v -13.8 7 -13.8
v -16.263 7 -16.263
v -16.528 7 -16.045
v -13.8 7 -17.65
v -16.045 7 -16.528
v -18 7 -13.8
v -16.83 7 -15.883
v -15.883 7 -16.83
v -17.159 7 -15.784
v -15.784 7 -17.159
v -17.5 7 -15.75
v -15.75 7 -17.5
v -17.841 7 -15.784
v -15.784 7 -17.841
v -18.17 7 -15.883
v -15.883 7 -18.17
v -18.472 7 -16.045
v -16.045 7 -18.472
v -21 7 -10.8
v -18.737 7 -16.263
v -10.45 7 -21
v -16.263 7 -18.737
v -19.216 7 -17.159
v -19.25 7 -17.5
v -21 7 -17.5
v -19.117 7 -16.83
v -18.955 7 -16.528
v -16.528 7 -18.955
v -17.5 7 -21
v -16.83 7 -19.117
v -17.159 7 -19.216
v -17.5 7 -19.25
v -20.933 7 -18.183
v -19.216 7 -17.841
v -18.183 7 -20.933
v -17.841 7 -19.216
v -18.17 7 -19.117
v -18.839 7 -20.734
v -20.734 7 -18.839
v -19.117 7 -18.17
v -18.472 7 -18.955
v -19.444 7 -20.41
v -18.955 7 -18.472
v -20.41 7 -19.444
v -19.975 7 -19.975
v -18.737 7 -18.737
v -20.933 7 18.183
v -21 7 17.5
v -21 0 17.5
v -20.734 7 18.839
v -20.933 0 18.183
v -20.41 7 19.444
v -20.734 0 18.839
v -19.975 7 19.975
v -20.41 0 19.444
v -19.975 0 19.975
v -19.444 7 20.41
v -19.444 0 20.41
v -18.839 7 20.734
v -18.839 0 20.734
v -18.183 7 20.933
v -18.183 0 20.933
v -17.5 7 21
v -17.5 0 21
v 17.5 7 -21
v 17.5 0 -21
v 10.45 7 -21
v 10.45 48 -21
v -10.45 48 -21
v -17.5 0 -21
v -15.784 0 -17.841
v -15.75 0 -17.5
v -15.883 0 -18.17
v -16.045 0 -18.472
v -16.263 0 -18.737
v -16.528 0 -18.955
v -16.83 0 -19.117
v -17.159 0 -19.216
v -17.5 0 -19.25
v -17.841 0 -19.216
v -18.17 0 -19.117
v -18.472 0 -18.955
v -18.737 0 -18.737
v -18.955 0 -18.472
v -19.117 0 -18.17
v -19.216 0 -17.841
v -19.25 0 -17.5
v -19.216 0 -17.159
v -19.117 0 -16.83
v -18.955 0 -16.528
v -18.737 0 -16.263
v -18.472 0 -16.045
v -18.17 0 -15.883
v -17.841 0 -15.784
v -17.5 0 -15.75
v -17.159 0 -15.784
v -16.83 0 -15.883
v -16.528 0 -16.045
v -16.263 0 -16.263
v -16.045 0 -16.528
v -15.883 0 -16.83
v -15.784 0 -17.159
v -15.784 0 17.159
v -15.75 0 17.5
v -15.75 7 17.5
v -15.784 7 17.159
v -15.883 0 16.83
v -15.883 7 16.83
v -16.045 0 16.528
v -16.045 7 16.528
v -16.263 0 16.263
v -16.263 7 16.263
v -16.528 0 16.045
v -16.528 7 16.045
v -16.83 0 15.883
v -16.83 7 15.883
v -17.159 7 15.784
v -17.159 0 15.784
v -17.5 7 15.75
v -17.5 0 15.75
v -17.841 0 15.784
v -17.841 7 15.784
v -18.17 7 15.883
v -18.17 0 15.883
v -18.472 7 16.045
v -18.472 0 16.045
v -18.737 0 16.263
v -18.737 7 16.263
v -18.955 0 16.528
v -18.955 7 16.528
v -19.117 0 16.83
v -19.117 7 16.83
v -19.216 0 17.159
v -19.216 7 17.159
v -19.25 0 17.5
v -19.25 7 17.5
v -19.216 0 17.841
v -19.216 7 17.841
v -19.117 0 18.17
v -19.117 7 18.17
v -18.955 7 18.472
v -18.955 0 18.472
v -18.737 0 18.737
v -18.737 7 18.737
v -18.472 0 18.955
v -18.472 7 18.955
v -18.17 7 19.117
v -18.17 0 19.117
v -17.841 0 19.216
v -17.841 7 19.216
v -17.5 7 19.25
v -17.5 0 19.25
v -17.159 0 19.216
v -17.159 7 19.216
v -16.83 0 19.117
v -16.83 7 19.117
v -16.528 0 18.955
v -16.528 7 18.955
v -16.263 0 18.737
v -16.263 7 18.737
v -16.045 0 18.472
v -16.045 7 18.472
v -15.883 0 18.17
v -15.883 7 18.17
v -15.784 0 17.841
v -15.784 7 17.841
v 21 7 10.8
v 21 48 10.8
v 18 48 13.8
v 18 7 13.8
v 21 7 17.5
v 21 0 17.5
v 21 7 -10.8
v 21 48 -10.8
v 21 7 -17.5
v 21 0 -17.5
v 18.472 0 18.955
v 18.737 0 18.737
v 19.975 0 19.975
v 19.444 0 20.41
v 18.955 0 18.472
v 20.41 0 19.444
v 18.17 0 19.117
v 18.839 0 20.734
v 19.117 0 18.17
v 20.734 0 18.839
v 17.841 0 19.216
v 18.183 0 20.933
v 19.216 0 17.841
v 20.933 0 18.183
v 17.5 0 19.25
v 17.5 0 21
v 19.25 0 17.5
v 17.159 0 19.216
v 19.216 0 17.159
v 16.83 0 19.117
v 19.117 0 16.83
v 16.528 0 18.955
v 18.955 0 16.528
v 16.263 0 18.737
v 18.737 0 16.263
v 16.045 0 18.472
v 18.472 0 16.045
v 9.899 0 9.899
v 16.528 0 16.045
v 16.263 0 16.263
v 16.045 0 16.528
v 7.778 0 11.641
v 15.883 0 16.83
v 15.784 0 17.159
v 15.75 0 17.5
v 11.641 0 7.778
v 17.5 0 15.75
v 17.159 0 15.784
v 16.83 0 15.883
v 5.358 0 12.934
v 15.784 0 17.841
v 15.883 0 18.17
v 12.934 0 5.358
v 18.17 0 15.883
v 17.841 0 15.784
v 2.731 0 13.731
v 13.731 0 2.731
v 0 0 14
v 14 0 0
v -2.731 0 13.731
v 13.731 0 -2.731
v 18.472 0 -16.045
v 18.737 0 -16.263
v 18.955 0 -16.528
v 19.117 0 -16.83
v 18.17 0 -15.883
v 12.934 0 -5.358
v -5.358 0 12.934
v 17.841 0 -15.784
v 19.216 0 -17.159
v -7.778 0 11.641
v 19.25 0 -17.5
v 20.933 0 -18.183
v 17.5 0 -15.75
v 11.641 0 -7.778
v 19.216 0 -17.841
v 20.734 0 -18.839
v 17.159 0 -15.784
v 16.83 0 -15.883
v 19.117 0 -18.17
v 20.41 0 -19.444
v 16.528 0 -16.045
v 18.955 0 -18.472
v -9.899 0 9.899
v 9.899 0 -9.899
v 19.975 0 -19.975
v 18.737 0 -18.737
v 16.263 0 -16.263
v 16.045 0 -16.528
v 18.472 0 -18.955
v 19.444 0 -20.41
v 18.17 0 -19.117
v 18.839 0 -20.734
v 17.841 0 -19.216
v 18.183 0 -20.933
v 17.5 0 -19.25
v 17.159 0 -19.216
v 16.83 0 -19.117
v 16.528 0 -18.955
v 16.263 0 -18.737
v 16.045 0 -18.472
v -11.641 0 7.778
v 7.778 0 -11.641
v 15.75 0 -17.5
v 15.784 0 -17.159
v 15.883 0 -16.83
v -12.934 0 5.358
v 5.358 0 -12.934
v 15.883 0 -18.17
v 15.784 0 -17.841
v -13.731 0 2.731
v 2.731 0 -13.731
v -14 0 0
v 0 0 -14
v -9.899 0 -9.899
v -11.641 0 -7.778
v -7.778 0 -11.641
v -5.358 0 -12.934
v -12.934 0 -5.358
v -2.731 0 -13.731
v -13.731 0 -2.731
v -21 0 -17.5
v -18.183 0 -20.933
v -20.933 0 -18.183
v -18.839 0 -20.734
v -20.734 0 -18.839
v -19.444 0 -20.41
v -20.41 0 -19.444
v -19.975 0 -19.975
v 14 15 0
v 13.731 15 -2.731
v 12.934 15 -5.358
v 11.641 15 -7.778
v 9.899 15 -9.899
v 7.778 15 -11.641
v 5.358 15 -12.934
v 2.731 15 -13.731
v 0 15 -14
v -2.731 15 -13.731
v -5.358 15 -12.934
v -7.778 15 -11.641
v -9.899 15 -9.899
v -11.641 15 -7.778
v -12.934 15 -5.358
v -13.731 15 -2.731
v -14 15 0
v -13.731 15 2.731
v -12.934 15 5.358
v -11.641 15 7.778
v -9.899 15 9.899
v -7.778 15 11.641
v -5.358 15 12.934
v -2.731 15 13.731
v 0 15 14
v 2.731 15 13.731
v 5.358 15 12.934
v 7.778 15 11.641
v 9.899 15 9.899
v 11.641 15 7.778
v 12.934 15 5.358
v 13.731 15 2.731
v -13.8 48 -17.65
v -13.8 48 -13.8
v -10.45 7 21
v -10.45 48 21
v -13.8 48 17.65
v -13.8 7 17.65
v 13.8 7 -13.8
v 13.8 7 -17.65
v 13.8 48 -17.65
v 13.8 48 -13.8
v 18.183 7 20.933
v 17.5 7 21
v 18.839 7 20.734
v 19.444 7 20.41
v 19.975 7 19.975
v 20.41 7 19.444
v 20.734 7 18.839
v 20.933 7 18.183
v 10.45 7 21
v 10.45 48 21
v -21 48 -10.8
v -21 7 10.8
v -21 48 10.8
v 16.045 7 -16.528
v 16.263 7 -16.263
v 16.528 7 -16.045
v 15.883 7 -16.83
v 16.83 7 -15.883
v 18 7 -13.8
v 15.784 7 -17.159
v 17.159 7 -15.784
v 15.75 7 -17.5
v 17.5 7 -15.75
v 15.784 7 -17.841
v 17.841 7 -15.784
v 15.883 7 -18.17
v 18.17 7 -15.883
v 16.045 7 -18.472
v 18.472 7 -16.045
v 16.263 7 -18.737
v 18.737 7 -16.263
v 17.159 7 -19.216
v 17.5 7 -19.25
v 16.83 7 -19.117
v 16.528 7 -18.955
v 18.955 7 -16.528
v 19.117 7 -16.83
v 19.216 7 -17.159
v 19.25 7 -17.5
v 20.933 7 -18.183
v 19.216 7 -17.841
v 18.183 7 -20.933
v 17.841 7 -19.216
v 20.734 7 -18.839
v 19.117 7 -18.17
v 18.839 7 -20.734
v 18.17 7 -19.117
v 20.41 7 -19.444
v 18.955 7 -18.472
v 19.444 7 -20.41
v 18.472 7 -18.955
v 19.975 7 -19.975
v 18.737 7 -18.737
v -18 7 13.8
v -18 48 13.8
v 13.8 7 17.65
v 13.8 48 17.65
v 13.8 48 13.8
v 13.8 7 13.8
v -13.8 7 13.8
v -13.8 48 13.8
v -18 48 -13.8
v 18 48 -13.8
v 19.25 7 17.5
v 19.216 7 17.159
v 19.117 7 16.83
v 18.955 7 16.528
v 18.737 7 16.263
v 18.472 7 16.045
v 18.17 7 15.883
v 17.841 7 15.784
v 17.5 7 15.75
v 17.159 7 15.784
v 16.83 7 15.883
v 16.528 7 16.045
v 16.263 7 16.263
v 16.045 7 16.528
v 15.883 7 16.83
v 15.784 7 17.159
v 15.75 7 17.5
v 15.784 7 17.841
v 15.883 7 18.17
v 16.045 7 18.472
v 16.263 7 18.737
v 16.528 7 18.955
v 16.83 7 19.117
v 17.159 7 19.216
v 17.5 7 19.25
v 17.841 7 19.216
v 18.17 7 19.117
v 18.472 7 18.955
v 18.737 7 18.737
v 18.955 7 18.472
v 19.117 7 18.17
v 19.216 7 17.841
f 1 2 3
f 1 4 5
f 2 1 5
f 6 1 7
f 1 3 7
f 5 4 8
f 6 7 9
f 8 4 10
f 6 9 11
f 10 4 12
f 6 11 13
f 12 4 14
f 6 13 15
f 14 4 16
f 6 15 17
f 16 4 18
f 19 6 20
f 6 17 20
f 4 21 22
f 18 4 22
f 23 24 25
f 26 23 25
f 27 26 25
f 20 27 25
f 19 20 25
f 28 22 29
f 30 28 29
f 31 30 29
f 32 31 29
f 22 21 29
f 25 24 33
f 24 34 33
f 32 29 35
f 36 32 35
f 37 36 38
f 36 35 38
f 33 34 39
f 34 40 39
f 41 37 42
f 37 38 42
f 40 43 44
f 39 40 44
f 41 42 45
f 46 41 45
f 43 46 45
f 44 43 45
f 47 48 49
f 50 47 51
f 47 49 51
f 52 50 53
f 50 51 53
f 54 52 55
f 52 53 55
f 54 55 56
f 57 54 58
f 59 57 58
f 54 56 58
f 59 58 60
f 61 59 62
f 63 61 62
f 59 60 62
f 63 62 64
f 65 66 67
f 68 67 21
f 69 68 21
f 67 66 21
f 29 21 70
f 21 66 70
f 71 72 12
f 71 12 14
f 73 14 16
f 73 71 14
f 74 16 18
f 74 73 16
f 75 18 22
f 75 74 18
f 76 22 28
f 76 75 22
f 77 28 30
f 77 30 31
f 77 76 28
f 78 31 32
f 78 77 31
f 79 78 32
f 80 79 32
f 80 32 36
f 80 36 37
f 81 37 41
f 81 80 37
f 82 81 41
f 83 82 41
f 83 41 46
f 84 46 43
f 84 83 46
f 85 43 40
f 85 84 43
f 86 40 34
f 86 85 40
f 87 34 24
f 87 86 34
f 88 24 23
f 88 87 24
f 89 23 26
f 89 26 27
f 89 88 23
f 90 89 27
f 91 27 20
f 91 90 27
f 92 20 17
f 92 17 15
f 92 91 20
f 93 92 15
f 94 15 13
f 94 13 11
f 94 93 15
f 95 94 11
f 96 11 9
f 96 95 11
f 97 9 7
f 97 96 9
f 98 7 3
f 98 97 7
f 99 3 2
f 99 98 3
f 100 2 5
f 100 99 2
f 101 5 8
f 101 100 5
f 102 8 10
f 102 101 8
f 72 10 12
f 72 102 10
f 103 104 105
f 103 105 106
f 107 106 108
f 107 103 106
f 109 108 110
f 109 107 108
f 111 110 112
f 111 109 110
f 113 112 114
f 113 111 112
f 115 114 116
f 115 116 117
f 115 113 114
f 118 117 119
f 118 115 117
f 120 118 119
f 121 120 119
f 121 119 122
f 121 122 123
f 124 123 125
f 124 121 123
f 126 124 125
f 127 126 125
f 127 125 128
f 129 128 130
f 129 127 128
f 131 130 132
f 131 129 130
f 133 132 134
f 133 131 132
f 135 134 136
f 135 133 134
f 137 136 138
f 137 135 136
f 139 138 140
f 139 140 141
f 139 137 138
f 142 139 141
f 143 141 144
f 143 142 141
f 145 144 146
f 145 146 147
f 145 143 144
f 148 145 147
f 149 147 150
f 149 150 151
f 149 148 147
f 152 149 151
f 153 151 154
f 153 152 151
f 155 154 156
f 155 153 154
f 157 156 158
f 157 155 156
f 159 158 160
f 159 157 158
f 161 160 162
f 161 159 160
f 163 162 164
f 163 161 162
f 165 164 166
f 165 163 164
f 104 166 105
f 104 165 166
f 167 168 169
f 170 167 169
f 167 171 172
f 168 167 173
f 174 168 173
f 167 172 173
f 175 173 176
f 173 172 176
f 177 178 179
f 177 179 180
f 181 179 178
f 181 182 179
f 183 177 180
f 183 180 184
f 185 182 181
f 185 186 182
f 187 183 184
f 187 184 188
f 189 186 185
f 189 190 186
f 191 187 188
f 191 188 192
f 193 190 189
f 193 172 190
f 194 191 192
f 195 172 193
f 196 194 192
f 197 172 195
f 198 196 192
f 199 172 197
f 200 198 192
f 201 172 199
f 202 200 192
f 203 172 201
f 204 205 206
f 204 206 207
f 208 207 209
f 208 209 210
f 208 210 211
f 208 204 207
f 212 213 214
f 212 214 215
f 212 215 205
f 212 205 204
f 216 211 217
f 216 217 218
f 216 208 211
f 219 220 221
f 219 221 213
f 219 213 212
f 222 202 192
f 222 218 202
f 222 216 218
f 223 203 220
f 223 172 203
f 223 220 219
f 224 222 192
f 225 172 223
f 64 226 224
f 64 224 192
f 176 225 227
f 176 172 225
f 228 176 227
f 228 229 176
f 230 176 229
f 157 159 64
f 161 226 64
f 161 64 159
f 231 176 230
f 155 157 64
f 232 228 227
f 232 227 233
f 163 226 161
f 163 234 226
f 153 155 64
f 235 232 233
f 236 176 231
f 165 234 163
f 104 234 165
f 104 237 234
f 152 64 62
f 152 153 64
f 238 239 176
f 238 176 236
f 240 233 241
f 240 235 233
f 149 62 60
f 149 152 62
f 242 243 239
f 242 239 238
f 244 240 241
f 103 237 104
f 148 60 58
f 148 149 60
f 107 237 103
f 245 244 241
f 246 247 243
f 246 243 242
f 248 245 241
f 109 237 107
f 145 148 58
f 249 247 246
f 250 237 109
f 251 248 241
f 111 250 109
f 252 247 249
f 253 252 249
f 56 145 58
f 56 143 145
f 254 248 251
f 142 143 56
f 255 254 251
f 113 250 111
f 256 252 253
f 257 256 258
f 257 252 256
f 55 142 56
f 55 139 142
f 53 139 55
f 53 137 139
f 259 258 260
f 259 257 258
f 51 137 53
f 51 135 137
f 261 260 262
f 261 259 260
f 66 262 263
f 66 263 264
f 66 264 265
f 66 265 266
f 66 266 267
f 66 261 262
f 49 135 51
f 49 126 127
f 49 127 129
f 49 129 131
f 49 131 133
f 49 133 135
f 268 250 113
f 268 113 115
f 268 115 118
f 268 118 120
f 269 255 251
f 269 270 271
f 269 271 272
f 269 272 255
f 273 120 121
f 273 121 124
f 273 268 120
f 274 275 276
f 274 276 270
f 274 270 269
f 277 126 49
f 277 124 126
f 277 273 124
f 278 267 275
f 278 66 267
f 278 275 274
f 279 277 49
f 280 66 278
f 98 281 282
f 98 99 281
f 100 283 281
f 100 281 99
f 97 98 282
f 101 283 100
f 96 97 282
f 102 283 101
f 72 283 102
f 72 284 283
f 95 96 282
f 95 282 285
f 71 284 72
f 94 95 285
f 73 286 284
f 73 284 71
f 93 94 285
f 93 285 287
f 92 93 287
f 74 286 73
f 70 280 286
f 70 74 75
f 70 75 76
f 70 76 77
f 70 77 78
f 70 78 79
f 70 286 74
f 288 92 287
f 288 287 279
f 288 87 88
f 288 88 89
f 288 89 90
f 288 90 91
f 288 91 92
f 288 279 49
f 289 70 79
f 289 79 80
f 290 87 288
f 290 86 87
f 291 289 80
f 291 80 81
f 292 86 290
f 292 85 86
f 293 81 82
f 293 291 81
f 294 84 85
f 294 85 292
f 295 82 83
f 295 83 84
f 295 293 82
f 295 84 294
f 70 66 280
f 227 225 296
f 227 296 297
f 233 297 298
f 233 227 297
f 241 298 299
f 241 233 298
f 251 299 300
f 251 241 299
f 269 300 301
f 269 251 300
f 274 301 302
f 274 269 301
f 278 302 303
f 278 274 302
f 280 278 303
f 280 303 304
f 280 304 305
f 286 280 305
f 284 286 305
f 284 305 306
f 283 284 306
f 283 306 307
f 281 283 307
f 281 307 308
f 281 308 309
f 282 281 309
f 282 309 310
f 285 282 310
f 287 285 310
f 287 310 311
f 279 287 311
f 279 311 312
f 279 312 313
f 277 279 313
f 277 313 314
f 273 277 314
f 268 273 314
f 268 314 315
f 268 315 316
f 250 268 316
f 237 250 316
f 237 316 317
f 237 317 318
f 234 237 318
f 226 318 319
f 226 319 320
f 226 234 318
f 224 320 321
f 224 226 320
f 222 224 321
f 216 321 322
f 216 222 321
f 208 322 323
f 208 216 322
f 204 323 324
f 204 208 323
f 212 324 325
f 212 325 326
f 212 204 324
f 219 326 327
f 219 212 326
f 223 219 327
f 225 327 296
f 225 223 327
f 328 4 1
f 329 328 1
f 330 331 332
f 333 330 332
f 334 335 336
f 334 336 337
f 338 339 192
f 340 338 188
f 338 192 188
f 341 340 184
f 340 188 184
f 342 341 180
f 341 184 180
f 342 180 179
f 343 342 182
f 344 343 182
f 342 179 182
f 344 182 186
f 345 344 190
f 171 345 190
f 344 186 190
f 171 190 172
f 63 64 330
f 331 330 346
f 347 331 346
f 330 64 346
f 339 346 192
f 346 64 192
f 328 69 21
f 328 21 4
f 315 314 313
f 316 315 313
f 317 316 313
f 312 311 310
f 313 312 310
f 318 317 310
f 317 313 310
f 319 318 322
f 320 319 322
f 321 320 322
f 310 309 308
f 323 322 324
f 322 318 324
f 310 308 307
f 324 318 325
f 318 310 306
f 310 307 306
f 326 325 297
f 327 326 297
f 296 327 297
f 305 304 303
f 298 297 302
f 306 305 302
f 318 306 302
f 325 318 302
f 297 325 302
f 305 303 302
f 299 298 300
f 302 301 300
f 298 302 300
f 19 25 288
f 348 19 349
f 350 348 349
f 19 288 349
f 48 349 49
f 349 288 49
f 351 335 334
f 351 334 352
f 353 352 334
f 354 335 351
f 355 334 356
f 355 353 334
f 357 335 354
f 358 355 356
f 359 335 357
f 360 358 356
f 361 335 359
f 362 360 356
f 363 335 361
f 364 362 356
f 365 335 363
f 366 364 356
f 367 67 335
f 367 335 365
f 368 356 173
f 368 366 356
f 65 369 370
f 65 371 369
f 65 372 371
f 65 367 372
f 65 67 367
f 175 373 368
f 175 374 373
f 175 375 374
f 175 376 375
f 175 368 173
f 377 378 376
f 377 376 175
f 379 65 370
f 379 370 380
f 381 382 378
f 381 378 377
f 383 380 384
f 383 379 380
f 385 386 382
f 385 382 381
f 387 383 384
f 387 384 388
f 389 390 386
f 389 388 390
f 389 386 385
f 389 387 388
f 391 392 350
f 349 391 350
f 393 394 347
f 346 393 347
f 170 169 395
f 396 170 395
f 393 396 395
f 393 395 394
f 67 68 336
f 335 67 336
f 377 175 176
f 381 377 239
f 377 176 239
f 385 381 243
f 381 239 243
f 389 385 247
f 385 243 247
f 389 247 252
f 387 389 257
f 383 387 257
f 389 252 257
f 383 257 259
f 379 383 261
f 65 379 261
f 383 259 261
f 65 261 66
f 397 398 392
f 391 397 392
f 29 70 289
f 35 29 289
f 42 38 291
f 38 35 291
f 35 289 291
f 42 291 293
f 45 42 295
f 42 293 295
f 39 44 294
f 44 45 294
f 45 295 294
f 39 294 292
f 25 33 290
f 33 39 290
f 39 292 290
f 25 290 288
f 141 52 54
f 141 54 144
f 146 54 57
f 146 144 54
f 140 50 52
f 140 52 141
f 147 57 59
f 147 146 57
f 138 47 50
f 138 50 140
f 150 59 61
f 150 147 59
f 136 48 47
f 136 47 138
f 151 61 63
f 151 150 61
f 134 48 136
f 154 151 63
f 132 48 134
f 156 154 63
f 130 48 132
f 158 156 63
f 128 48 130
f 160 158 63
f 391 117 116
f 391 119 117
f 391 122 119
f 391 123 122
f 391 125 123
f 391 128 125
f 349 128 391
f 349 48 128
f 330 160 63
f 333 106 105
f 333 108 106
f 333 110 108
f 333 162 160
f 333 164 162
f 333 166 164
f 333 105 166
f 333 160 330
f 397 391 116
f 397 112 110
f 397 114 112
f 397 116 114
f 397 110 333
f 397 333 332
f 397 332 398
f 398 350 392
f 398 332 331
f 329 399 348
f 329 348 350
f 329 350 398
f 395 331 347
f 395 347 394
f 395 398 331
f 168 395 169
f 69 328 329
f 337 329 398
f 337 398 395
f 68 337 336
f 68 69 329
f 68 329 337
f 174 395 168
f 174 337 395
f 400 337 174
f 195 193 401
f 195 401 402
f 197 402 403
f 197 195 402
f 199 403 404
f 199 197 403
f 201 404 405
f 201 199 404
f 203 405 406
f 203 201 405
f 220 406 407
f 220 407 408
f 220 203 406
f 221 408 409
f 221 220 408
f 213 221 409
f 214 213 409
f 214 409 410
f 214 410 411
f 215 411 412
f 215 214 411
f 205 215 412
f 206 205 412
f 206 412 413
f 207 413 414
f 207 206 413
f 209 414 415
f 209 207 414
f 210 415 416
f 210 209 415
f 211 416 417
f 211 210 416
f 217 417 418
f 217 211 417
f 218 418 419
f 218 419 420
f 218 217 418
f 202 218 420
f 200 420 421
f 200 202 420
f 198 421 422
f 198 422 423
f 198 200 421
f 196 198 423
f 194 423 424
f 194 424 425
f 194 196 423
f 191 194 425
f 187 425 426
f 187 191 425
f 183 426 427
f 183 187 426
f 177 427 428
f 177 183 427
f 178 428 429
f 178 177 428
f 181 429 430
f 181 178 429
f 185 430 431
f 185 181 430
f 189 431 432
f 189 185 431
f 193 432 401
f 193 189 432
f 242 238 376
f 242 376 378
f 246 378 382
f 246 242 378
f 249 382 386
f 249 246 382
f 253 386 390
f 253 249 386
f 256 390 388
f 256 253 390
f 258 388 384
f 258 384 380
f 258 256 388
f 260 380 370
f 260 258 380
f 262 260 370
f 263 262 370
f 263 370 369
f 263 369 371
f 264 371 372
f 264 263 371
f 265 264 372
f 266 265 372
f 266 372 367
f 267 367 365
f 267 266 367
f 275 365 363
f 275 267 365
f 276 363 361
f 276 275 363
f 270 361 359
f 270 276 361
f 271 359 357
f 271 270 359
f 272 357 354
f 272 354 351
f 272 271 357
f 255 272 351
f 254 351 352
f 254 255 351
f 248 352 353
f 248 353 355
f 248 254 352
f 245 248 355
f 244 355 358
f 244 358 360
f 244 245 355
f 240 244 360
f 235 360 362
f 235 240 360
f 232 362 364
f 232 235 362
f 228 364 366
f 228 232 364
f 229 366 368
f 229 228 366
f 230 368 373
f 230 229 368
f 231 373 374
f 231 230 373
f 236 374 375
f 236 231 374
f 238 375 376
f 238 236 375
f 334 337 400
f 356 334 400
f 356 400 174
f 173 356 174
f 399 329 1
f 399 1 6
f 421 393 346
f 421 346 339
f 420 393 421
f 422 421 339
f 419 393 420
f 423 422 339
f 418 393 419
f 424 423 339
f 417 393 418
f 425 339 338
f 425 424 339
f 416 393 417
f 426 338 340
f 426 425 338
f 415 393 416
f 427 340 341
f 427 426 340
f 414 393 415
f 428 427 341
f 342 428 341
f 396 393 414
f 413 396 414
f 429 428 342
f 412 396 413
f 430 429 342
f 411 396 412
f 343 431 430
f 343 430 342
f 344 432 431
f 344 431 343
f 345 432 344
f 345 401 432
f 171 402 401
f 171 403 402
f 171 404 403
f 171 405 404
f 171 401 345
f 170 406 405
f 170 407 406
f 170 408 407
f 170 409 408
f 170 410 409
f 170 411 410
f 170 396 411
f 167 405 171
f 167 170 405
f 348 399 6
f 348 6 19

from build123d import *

# Parameters (mm, degrees)
SKETCH1_R           = 1.75
SKETCH1_R_2         = 14
BOSS_EXTRUDE1_DEPTH = 7
BOSS_EXTRUDE2_DEPTH = 34
BOSS_EXTRUDE3_DEPTH = 7
CUT_EXTRUDE1_START  = -41
CUT_EXTRUDE1_DEPTH  = 41
SKETCH1_2_R         = 14
CUT_EXTRUDE2_DEPTH  = 15


with BuildPart() as part:
    # Sketch1 → Boss-Extrude1 (new body)
    with BuildSketch(Plane(origin=(0, 0, 0), x_dir=(1, 0, 0), z_dir=(0, 1, 0))):
        with BuildLine():
            Line((17.5, -21), (-17.5, -21))
            ThreePointArc((-17.5, -21), (-19.974873734, -19.974873734), (-21, -17.5))
            Line((-21, -17.5), (-21, 17.5))
            ThreePointArc((-21, 17.5), (-19.974873734, 19.974873734), (-17.5, 21))
            Line((-17.5, 21), (17.5, 21))
            ThreePointArc((17.5, 21), (19.974873734, 19.974873734), (21, 17.5))
            Line((21, 17.5), (21, -17.5))
            ThreePointArc((21, -17.5), (19.974873734, -19.974873734), (17.5, -21))
        make_face()
        with Locations((-17.5, -17.5)):
            Circle(SKETCH1_R, mode=Mode.SUBTRACT)
        with Locations((-17.5, 17.5)):
            Circle(SKETCH1_R, mode=Mode.SUBTRACT)
        with Locations((17.5, -17.5)):
            Circle(SKETCH1_R, mode=Mode.SUBTRACT)
        with Locations((17.5, 17.5)):
            Circle(SKETCH1_R, mode=Mode.SUBTRACT)
        Circle(SKETCH1_R_2, mode=Mode.SUBTRACT)
    extrude(amount=BOSS_EXTRUDE1_DEPTH)

    # Sketch2 → Boss-Extrude2 (add)
    with BuildSketch(Plane(origin=(0, 7, 0), x_dir=(1, 0, 0), z_dir=(0, 1, 0))):
        with BuildLine():
            Line((21, -17.5), (21, 17.5))
            ThreePointArc((21, 17.5), (19.974873734, 19.974873734), (17.5, 21))
            Line((17.5, 21), (-17.5, 21))
            ThreePointArc((-17.5, 21), (-19.974873734, 19.974873734), (-21, 17.5))
            Line((-21, 17.5), (-21, -17.5))
            ThreePointArc((-21, -17.5), (-19.974873734, -19.974873734), (-17.5, -21))
            Line((-17.5, -21), (17.5, -21))
            ThreePointArc((17.5, -21), (19.974873734, -19.974873734), (21, -17.5))
        make_face()
    extrude(amount=BOSS_EXTRUDE2_DEPTH)

    # Sketch3 → Boss-Extrude3 (add)
    with BuildSketch(Plane(origin=(0, 41, 0), x_dir=(1, 0, 0), z_dir=(0, 1, 0))):
        with BuildLine():
            Line((17.5, 21), (-17.5, 21))
            ThreePointArc((-17.5, 21), (-19.974873734, 19.974873734), (-21, 17.5))
            Line((-21, 17.5), (-21, -17.5))
            ThreePointArc((-21, -17.5), (-19.974873734, -19.974873734), (-17.5, -21))
            Line((-17.5, -21), (17.5, -21))
            ThreePointArc((17.5, -21), (19.974873734, -19.974873734), (21, -17.5))
            Line((21, -17.5), (21, 17.5))
            ThreePointArc((21, 17.5), (19.974873734, 19.974873734), (17.5, 21))
        make_face()
    extrude(amount=BOSS_EXTRUDE3_DEPTH)

    # Sketch4 → Cut-Extrude1 (cut)
    with BuildSketch(Plane(origin=(0, 48, 0), x_dir=(1, 0, 0), z_dir=(0, 1, 0)).offset(CUT_EXTRUDE1_START)):
        with BuildLine():
            Line((-13.8, 13.8), (-18, 13.8))
            Line((-18, 13.8), (-21, 10.8))
            Line((-21, 10.8), (-21, 17.5))
            ThreePointArc((-21, 17.5), (-19.974873734, 19.974873734), (-17.5, 21))
            Line((-17.5, 21), (-10.45, 21))
            Line((-10.45, 21), (-13.8, 17.65))
            Line((-13.8, 17.65), (-13.8, 13.8))
        make_face()
        with BuildLine():
            Line((17.5, 21), (10.45, 21))
            Line((10.45, 21), (13.8, 17.65))
            Line((13.8, 17.65), (13.8, 13.8))
            Line((13.8, 13.8), (18, 13.8))
            Line((18, 13.8), (21, 10.8))
            Line((21, 10.8), (21, 17.5))
            ThreePointArc((21, 17.5), (19.974873734, 19.974873734), (17.5, 21))
        make_face()
        with BuildLine():
            Line((-17.5, -21), (-10.45, -21))
            Line((-10.45, -21), (-13.8, -17.65))
            Line((-13.8, -17.65), (-13.8, -13.8))
            Line((-13.8, -13.8), (-18, -13.8))
            Line((-18, -13.8), (-21, -10.8))
            Line((-21, -10.8), (-21, -17.5))
            ThreePointArc((-21, -17.5), (-19.974873734, -19.974873734), (-17.5, -21))
        make_face()
        with BuildLine():
            Line((21, -17.5), (21, -10.8))
            Line((21, -10.8), (18, -13.8))
            Line((18, -13.8), (13.8, -13.8))
            Line((13.8, -13.8), (13.8, -17.65))
            Line((13.8, -17.65), (10.45, -21))
            Line((10.45, -21), (17.5, -21))
            ThreePointArc((17.5, -21), (19.974873734, -19.974873734), (21, -17.5))
        make_face()
    extrude(amount=CUT_EXTRUDE1_DEPTH, mode=Mode.SUBTRACT)

    # Sketch1<2> → Cut-Extrude2 (cut)
    with BuildSketch(Plane(origin=(0, 0, 0), x_dir=(1, 0, 0), z_dir=(0, 1, 0))):
        Circle(SKETCH1_2_R)
    extrude(amount=CUT_EXTRUDE2_DEPTH, mode=Mode.SUBTRACT)


solid = part.part
